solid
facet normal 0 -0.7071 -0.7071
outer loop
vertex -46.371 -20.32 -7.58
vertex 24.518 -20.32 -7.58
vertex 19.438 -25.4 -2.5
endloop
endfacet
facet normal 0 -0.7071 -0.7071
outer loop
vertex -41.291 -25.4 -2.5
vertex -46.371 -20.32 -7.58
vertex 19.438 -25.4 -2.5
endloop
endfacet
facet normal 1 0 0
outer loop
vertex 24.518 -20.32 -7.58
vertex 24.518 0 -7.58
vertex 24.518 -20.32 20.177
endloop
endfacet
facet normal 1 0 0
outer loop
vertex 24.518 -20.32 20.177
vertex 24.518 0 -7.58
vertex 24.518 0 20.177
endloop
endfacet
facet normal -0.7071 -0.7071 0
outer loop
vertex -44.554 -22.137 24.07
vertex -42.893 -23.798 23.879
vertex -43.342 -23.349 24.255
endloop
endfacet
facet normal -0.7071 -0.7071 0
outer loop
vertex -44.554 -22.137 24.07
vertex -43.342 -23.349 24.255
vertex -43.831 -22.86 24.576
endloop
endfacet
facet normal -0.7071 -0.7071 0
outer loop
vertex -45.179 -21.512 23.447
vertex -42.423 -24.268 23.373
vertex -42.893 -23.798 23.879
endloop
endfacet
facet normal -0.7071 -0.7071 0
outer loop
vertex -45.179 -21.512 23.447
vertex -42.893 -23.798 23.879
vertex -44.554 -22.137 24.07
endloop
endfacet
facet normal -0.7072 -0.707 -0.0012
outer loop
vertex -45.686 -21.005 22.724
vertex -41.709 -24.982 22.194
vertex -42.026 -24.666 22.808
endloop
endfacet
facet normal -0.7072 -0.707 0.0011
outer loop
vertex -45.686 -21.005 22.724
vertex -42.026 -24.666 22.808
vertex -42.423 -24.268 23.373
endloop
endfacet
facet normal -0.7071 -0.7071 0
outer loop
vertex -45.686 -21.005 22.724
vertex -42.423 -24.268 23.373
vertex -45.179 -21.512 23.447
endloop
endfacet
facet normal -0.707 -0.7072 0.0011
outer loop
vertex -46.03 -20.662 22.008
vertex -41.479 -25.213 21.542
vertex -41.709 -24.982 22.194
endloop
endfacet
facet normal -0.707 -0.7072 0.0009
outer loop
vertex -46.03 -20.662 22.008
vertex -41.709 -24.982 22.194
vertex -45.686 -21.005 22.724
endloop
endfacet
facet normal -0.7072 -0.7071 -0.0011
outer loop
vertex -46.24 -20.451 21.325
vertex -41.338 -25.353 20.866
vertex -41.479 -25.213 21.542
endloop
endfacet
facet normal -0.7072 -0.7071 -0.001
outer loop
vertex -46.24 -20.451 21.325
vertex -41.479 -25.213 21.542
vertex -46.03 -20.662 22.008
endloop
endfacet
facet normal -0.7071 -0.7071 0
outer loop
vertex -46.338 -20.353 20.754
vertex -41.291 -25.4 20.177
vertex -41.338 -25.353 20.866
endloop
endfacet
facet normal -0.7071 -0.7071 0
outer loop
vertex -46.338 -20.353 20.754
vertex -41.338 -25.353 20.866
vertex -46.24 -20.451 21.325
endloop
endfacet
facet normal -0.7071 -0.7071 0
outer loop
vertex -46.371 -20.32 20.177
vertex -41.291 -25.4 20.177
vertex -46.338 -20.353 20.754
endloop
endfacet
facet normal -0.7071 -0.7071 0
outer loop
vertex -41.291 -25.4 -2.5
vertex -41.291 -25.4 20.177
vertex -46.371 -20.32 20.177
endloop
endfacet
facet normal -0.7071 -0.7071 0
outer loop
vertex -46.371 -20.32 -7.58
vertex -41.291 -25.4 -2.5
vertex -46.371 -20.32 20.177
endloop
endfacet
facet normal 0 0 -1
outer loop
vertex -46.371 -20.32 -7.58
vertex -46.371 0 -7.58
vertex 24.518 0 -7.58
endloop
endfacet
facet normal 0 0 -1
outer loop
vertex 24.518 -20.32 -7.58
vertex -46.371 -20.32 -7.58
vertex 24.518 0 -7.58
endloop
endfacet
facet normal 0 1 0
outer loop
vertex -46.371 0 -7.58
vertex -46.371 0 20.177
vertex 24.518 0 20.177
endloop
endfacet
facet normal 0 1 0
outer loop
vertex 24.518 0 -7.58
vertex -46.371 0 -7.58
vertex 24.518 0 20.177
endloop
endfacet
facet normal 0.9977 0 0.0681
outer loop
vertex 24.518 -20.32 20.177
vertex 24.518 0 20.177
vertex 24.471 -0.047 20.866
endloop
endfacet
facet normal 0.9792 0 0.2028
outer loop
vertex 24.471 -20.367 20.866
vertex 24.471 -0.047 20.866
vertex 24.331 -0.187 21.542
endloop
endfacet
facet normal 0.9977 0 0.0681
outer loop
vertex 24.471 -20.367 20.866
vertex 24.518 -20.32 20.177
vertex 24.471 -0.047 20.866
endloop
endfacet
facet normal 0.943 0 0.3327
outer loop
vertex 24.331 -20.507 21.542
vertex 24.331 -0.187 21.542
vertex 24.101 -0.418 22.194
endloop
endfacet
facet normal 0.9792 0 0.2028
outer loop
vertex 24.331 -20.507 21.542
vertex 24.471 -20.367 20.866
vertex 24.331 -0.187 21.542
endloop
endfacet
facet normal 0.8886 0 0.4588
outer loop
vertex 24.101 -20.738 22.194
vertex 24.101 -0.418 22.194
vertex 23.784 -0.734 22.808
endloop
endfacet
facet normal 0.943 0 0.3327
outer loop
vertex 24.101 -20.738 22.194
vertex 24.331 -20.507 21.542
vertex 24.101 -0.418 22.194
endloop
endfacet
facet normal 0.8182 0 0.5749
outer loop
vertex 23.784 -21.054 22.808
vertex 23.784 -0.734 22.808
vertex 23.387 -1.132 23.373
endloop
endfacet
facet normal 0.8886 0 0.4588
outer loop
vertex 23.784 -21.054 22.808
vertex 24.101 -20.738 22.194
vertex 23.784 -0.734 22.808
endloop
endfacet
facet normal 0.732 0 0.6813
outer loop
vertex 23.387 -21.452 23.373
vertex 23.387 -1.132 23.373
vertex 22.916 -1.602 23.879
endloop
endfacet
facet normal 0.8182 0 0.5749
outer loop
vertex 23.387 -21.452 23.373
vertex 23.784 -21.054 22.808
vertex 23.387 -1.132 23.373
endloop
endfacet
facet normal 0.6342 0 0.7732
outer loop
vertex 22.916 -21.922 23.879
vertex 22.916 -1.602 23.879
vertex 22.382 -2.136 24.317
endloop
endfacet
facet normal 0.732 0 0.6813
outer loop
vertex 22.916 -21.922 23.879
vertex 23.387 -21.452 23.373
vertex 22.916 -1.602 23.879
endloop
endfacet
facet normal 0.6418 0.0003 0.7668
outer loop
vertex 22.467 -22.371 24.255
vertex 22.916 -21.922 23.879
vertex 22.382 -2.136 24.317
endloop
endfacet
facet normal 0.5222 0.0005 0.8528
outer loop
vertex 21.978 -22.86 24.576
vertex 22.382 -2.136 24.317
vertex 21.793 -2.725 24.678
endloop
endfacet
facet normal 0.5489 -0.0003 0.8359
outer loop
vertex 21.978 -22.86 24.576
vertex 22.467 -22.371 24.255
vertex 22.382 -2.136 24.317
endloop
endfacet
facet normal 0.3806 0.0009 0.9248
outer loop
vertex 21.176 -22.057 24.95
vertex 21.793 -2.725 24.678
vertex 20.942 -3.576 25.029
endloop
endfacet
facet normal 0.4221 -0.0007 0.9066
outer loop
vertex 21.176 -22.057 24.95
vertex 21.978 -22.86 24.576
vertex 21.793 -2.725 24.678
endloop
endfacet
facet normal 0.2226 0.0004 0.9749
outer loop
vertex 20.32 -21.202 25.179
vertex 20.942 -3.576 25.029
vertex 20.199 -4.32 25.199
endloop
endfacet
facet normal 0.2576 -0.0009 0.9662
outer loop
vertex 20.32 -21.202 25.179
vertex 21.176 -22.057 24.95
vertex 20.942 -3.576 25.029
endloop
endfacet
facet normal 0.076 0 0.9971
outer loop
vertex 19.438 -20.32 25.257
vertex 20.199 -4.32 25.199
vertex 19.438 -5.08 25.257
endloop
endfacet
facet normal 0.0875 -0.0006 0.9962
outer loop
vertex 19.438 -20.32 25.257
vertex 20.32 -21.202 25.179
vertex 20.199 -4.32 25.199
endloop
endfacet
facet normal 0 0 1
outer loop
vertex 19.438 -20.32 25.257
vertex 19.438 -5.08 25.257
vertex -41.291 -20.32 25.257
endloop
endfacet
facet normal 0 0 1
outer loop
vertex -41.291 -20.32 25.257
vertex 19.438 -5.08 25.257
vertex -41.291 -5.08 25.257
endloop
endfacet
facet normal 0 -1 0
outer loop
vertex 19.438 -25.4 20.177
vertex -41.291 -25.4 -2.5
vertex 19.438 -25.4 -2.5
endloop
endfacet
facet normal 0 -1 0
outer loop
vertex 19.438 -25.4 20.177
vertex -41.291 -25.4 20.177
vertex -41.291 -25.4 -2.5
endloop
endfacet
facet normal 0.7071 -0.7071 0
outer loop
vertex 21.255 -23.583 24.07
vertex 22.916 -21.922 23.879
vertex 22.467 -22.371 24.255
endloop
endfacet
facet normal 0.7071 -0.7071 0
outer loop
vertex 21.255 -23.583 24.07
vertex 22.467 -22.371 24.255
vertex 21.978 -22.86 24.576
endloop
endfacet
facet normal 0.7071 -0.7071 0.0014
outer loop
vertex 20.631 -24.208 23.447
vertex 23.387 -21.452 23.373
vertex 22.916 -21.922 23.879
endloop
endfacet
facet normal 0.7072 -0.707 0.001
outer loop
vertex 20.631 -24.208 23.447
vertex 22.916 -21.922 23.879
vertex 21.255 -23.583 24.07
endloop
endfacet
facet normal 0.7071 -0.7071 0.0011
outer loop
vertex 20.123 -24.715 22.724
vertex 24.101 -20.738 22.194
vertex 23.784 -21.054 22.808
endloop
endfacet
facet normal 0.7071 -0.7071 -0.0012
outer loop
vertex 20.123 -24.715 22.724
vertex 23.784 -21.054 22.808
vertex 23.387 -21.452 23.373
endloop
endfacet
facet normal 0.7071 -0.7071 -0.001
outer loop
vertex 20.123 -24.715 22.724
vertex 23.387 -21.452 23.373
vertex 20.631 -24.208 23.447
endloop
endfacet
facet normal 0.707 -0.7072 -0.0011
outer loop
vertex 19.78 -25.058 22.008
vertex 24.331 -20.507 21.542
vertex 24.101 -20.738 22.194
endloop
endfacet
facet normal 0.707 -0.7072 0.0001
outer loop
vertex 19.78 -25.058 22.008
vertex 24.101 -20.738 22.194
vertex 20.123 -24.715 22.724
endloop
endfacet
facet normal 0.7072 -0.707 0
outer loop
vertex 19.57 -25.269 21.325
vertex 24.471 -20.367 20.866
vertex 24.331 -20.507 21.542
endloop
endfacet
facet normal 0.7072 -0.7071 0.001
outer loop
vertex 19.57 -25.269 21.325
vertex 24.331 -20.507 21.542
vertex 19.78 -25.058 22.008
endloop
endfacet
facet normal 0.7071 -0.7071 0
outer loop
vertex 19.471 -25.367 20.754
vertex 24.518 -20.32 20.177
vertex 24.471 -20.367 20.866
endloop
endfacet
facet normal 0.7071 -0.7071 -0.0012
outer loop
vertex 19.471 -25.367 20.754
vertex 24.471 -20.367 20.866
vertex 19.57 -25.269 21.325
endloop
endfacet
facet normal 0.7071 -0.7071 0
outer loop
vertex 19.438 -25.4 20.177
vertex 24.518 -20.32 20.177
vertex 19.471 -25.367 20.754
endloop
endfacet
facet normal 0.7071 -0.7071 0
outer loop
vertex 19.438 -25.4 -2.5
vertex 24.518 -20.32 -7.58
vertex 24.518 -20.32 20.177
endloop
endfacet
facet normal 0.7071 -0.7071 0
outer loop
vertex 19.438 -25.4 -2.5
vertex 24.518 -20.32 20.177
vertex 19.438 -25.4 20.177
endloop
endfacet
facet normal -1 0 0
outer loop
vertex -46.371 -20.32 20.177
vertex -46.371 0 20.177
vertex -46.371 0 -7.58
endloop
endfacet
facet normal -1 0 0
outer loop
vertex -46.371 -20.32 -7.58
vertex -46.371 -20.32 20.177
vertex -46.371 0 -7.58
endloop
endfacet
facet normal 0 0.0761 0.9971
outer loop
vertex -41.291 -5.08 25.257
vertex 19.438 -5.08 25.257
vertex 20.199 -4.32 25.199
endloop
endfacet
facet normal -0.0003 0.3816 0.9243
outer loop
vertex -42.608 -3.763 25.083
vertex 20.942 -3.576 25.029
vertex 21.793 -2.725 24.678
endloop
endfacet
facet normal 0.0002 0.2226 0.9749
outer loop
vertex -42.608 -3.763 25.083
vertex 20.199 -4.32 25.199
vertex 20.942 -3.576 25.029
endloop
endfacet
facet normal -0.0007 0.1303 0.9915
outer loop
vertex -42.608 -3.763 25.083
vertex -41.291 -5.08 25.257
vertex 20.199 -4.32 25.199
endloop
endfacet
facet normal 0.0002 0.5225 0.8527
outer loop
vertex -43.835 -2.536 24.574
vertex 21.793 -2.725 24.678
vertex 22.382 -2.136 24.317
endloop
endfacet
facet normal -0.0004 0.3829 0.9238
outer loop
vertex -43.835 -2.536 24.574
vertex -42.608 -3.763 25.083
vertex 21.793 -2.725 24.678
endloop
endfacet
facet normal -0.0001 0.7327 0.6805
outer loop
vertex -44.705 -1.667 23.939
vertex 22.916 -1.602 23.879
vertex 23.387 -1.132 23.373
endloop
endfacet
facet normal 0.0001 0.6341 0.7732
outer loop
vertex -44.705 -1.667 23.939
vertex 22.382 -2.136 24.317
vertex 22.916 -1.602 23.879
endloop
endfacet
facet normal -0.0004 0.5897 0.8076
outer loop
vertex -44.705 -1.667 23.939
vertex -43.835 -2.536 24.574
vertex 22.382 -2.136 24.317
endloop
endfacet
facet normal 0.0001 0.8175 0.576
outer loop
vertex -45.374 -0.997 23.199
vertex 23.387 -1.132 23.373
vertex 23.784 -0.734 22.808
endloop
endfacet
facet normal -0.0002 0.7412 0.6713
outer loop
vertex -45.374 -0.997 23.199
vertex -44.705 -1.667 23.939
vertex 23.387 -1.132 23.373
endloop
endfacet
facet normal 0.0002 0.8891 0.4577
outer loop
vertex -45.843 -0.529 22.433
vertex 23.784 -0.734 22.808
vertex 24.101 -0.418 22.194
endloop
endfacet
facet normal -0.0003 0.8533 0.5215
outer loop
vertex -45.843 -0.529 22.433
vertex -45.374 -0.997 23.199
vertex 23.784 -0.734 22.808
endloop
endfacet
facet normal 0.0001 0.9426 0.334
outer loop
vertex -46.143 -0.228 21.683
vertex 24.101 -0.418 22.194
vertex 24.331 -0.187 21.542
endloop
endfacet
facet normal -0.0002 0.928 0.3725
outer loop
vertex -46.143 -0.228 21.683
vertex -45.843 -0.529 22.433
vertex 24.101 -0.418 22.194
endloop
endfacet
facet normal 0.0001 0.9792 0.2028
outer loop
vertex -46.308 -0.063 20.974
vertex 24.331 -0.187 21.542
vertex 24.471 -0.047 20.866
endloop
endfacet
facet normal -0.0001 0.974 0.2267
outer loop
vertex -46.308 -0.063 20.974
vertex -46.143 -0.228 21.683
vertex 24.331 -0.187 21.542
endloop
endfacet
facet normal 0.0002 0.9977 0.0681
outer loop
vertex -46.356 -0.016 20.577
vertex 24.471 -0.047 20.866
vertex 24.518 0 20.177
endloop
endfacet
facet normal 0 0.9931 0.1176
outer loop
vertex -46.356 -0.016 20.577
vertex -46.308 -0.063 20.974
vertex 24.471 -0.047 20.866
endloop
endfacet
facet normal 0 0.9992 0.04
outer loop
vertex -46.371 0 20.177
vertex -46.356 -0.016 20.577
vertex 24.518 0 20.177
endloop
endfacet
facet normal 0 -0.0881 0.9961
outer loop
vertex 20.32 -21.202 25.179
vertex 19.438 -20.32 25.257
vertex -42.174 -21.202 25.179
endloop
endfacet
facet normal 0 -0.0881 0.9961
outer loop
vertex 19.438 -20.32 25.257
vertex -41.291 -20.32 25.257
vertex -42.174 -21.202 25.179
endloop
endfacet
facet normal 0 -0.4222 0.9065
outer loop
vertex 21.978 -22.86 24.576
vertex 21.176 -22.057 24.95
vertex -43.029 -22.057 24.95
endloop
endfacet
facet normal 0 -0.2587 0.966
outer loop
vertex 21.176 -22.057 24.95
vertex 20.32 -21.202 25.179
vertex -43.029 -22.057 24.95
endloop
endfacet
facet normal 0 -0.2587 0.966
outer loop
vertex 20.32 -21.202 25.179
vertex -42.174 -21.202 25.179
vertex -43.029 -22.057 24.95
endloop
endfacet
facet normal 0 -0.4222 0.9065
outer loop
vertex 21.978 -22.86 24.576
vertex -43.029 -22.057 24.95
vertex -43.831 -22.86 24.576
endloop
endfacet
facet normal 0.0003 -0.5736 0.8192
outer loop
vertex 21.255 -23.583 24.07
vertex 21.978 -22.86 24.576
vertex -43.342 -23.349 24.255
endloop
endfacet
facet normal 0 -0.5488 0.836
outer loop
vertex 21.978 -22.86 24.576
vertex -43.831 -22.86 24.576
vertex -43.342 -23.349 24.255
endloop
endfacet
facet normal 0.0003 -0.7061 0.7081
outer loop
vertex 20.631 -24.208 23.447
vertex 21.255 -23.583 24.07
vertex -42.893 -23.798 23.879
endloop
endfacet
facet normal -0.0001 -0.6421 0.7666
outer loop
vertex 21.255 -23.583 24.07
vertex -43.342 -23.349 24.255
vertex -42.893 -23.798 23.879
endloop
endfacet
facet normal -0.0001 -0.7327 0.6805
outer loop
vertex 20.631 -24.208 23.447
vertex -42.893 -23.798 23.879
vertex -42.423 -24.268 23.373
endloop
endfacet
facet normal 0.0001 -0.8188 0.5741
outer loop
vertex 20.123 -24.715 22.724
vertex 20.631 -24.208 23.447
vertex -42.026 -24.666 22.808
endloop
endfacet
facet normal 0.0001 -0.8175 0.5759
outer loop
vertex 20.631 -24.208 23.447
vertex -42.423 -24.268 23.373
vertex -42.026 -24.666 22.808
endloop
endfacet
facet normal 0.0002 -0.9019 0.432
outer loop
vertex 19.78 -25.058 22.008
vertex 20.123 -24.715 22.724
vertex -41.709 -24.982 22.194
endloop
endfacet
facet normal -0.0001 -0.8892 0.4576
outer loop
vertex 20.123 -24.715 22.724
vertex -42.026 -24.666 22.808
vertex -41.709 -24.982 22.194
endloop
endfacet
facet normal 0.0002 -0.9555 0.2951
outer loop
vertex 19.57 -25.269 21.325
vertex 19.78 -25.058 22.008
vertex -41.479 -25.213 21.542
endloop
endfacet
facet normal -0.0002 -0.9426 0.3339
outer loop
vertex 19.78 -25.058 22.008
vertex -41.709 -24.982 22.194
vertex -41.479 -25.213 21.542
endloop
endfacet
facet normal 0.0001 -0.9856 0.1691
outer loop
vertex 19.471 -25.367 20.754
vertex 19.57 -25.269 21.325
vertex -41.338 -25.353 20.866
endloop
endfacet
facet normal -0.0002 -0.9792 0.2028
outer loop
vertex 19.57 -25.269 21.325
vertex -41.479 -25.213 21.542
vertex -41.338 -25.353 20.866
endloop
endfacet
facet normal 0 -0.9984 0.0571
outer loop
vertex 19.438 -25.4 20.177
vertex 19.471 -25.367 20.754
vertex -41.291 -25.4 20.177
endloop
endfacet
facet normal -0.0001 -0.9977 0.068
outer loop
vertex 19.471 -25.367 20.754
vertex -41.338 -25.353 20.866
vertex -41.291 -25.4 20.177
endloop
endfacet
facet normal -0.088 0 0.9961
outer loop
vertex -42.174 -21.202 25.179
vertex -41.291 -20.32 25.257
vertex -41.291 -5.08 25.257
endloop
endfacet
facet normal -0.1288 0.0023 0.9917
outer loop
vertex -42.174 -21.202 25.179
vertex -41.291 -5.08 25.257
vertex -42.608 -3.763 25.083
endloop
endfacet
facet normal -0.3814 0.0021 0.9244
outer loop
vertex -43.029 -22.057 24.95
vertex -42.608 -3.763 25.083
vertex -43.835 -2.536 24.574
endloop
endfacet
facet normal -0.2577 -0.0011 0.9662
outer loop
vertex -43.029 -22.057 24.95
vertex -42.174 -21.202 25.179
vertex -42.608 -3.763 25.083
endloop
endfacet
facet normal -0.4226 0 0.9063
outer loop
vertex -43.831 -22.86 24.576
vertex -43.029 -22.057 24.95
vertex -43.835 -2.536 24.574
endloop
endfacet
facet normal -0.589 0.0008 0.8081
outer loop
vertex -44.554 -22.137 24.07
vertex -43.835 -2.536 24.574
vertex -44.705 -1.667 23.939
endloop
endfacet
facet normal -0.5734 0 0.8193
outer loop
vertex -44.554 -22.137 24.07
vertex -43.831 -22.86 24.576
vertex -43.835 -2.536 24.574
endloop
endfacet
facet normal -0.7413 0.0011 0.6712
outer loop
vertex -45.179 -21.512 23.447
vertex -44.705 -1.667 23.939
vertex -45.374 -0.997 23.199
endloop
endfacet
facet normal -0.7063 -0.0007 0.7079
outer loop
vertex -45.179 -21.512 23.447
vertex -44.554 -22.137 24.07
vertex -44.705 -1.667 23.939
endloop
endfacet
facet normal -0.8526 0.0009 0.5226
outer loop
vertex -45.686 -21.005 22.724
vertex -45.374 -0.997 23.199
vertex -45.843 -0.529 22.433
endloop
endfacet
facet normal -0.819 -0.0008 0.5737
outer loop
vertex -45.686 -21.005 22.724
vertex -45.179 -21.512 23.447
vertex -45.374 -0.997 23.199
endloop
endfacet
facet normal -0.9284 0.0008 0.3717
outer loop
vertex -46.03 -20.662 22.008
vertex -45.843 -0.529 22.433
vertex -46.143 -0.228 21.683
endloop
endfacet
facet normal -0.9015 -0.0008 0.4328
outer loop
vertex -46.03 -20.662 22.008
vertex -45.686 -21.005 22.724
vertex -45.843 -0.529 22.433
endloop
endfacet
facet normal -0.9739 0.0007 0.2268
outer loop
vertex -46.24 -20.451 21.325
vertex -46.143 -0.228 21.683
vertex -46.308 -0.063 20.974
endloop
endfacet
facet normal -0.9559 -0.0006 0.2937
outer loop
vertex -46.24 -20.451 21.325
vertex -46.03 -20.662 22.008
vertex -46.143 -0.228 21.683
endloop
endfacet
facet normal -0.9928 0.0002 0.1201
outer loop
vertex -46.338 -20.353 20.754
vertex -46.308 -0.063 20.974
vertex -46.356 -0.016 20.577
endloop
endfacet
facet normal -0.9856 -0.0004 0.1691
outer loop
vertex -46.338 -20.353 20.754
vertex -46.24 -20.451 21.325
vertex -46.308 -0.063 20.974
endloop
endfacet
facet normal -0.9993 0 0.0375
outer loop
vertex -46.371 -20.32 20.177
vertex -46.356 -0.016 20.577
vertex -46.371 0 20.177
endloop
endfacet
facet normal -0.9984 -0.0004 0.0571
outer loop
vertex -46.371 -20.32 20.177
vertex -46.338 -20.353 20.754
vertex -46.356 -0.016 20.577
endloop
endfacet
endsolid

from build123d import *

# Parameters (mm, degrees)
F1_DEPTH    = 25.4
F2_R        = 5.08
F3_T1_DEPTH = 53.8847270698
F3_T3_DEPTH = 97.0179937739


# Not quite as in the source:
# - a fillet or chamfer that OpenCascade refuses, or shapes differently, is made with other operations: its cross-section is extruded or revolved along the edge and cut away or added


with BuildPart() as f1:
    # F0 (on Front) → F1 (new body)
    with BuildSketch(Plane.XZ):
        with BuildLine():
            ThreePointArc((-26.0082527554, 9.7501287237), (-33.751696872, 20.4773638636), (-46.3714562356, 16.5054406347))
            Line((-46.3714562356, 16.5054406347), (-46.3714562356, 2.9948168126))
            ThreePointArc((-46.3714562356, 2.9948168126), (-33.751696872, -0.9771064163), (-26.0082527554, 9.7501287237))
        make_face()
        with BuildLine():
            Line((24.5182383806, 25.2565909177), (-46.3714562356, 25.2565909177))
            Line((-46.3714562356, 25.2565909177), (-46.3714562356, 16.5054406347))
            ThreePointArc((-46.3714562356, 16.5054406347), (-33.751696872, 20.4773638636), (-26.0082527554, 9.7501287237))
            ThreePointArc((-26.0082527554, 9.7501287237), (-33.751696872, -0.9771064163), (-46.3714562356, 2.9948168126))
            Line((-46.3714562356, 2.9948168126), (-46.3714562356, -7.5798369944))
            Line((-46.3714562356, -7.5798369944), (24.5182383806, -7.5798369944))
            Line((24.5182383806, -7.5798369944), (24.5182383806, 25.2565909177))
        make_face()
    extrude(amount=F1_DEPTH)

    # F2
    f2_edges = [f1.edges().sort_by_distance(p)[0] for p in [
        (24.518238, -12.7, 25.256591),
        (-46.371456, -12.7, 25.256591),
        (-10.926609, 0, 25.256591),
        (-10.926609, -25.4, 25.256591),
    ]]
    fillet(f2_edges, radius=F2_R)

    # F3: chamfer of 5.08 on 4 edges, made by hand

    # F3_s2 → F3_t1 (cut)
    with BuildSketch(Plane.XY.offset(-20.6439865733)):
        Polygon((-41.2914562356, -25.4), (-46.3714562356, -20.32), (-46.3714562356, -25.4), align=None)
        Polygon((24.5182383806, -20.32), (19.4382383806, -25.4), (24.5182383806, -25.4), align=None)
    extrude(amount=F3_T1_DEPTH, mode=Mode.SUBTRACT)

    # F3_s4 → F3_t3 (cut)
    with BuildSketch(Plane.YZ.offset(-59.4356058145)):
        Polygon((-20.32, -7.5798369944), (-25.4, -2.4998369944), (-25.4, -7.5798369944), align=None)
    extrude(amount=F3_T3_DEPTH, mode=Mode.SUBTRACT)


solid = f1.part
